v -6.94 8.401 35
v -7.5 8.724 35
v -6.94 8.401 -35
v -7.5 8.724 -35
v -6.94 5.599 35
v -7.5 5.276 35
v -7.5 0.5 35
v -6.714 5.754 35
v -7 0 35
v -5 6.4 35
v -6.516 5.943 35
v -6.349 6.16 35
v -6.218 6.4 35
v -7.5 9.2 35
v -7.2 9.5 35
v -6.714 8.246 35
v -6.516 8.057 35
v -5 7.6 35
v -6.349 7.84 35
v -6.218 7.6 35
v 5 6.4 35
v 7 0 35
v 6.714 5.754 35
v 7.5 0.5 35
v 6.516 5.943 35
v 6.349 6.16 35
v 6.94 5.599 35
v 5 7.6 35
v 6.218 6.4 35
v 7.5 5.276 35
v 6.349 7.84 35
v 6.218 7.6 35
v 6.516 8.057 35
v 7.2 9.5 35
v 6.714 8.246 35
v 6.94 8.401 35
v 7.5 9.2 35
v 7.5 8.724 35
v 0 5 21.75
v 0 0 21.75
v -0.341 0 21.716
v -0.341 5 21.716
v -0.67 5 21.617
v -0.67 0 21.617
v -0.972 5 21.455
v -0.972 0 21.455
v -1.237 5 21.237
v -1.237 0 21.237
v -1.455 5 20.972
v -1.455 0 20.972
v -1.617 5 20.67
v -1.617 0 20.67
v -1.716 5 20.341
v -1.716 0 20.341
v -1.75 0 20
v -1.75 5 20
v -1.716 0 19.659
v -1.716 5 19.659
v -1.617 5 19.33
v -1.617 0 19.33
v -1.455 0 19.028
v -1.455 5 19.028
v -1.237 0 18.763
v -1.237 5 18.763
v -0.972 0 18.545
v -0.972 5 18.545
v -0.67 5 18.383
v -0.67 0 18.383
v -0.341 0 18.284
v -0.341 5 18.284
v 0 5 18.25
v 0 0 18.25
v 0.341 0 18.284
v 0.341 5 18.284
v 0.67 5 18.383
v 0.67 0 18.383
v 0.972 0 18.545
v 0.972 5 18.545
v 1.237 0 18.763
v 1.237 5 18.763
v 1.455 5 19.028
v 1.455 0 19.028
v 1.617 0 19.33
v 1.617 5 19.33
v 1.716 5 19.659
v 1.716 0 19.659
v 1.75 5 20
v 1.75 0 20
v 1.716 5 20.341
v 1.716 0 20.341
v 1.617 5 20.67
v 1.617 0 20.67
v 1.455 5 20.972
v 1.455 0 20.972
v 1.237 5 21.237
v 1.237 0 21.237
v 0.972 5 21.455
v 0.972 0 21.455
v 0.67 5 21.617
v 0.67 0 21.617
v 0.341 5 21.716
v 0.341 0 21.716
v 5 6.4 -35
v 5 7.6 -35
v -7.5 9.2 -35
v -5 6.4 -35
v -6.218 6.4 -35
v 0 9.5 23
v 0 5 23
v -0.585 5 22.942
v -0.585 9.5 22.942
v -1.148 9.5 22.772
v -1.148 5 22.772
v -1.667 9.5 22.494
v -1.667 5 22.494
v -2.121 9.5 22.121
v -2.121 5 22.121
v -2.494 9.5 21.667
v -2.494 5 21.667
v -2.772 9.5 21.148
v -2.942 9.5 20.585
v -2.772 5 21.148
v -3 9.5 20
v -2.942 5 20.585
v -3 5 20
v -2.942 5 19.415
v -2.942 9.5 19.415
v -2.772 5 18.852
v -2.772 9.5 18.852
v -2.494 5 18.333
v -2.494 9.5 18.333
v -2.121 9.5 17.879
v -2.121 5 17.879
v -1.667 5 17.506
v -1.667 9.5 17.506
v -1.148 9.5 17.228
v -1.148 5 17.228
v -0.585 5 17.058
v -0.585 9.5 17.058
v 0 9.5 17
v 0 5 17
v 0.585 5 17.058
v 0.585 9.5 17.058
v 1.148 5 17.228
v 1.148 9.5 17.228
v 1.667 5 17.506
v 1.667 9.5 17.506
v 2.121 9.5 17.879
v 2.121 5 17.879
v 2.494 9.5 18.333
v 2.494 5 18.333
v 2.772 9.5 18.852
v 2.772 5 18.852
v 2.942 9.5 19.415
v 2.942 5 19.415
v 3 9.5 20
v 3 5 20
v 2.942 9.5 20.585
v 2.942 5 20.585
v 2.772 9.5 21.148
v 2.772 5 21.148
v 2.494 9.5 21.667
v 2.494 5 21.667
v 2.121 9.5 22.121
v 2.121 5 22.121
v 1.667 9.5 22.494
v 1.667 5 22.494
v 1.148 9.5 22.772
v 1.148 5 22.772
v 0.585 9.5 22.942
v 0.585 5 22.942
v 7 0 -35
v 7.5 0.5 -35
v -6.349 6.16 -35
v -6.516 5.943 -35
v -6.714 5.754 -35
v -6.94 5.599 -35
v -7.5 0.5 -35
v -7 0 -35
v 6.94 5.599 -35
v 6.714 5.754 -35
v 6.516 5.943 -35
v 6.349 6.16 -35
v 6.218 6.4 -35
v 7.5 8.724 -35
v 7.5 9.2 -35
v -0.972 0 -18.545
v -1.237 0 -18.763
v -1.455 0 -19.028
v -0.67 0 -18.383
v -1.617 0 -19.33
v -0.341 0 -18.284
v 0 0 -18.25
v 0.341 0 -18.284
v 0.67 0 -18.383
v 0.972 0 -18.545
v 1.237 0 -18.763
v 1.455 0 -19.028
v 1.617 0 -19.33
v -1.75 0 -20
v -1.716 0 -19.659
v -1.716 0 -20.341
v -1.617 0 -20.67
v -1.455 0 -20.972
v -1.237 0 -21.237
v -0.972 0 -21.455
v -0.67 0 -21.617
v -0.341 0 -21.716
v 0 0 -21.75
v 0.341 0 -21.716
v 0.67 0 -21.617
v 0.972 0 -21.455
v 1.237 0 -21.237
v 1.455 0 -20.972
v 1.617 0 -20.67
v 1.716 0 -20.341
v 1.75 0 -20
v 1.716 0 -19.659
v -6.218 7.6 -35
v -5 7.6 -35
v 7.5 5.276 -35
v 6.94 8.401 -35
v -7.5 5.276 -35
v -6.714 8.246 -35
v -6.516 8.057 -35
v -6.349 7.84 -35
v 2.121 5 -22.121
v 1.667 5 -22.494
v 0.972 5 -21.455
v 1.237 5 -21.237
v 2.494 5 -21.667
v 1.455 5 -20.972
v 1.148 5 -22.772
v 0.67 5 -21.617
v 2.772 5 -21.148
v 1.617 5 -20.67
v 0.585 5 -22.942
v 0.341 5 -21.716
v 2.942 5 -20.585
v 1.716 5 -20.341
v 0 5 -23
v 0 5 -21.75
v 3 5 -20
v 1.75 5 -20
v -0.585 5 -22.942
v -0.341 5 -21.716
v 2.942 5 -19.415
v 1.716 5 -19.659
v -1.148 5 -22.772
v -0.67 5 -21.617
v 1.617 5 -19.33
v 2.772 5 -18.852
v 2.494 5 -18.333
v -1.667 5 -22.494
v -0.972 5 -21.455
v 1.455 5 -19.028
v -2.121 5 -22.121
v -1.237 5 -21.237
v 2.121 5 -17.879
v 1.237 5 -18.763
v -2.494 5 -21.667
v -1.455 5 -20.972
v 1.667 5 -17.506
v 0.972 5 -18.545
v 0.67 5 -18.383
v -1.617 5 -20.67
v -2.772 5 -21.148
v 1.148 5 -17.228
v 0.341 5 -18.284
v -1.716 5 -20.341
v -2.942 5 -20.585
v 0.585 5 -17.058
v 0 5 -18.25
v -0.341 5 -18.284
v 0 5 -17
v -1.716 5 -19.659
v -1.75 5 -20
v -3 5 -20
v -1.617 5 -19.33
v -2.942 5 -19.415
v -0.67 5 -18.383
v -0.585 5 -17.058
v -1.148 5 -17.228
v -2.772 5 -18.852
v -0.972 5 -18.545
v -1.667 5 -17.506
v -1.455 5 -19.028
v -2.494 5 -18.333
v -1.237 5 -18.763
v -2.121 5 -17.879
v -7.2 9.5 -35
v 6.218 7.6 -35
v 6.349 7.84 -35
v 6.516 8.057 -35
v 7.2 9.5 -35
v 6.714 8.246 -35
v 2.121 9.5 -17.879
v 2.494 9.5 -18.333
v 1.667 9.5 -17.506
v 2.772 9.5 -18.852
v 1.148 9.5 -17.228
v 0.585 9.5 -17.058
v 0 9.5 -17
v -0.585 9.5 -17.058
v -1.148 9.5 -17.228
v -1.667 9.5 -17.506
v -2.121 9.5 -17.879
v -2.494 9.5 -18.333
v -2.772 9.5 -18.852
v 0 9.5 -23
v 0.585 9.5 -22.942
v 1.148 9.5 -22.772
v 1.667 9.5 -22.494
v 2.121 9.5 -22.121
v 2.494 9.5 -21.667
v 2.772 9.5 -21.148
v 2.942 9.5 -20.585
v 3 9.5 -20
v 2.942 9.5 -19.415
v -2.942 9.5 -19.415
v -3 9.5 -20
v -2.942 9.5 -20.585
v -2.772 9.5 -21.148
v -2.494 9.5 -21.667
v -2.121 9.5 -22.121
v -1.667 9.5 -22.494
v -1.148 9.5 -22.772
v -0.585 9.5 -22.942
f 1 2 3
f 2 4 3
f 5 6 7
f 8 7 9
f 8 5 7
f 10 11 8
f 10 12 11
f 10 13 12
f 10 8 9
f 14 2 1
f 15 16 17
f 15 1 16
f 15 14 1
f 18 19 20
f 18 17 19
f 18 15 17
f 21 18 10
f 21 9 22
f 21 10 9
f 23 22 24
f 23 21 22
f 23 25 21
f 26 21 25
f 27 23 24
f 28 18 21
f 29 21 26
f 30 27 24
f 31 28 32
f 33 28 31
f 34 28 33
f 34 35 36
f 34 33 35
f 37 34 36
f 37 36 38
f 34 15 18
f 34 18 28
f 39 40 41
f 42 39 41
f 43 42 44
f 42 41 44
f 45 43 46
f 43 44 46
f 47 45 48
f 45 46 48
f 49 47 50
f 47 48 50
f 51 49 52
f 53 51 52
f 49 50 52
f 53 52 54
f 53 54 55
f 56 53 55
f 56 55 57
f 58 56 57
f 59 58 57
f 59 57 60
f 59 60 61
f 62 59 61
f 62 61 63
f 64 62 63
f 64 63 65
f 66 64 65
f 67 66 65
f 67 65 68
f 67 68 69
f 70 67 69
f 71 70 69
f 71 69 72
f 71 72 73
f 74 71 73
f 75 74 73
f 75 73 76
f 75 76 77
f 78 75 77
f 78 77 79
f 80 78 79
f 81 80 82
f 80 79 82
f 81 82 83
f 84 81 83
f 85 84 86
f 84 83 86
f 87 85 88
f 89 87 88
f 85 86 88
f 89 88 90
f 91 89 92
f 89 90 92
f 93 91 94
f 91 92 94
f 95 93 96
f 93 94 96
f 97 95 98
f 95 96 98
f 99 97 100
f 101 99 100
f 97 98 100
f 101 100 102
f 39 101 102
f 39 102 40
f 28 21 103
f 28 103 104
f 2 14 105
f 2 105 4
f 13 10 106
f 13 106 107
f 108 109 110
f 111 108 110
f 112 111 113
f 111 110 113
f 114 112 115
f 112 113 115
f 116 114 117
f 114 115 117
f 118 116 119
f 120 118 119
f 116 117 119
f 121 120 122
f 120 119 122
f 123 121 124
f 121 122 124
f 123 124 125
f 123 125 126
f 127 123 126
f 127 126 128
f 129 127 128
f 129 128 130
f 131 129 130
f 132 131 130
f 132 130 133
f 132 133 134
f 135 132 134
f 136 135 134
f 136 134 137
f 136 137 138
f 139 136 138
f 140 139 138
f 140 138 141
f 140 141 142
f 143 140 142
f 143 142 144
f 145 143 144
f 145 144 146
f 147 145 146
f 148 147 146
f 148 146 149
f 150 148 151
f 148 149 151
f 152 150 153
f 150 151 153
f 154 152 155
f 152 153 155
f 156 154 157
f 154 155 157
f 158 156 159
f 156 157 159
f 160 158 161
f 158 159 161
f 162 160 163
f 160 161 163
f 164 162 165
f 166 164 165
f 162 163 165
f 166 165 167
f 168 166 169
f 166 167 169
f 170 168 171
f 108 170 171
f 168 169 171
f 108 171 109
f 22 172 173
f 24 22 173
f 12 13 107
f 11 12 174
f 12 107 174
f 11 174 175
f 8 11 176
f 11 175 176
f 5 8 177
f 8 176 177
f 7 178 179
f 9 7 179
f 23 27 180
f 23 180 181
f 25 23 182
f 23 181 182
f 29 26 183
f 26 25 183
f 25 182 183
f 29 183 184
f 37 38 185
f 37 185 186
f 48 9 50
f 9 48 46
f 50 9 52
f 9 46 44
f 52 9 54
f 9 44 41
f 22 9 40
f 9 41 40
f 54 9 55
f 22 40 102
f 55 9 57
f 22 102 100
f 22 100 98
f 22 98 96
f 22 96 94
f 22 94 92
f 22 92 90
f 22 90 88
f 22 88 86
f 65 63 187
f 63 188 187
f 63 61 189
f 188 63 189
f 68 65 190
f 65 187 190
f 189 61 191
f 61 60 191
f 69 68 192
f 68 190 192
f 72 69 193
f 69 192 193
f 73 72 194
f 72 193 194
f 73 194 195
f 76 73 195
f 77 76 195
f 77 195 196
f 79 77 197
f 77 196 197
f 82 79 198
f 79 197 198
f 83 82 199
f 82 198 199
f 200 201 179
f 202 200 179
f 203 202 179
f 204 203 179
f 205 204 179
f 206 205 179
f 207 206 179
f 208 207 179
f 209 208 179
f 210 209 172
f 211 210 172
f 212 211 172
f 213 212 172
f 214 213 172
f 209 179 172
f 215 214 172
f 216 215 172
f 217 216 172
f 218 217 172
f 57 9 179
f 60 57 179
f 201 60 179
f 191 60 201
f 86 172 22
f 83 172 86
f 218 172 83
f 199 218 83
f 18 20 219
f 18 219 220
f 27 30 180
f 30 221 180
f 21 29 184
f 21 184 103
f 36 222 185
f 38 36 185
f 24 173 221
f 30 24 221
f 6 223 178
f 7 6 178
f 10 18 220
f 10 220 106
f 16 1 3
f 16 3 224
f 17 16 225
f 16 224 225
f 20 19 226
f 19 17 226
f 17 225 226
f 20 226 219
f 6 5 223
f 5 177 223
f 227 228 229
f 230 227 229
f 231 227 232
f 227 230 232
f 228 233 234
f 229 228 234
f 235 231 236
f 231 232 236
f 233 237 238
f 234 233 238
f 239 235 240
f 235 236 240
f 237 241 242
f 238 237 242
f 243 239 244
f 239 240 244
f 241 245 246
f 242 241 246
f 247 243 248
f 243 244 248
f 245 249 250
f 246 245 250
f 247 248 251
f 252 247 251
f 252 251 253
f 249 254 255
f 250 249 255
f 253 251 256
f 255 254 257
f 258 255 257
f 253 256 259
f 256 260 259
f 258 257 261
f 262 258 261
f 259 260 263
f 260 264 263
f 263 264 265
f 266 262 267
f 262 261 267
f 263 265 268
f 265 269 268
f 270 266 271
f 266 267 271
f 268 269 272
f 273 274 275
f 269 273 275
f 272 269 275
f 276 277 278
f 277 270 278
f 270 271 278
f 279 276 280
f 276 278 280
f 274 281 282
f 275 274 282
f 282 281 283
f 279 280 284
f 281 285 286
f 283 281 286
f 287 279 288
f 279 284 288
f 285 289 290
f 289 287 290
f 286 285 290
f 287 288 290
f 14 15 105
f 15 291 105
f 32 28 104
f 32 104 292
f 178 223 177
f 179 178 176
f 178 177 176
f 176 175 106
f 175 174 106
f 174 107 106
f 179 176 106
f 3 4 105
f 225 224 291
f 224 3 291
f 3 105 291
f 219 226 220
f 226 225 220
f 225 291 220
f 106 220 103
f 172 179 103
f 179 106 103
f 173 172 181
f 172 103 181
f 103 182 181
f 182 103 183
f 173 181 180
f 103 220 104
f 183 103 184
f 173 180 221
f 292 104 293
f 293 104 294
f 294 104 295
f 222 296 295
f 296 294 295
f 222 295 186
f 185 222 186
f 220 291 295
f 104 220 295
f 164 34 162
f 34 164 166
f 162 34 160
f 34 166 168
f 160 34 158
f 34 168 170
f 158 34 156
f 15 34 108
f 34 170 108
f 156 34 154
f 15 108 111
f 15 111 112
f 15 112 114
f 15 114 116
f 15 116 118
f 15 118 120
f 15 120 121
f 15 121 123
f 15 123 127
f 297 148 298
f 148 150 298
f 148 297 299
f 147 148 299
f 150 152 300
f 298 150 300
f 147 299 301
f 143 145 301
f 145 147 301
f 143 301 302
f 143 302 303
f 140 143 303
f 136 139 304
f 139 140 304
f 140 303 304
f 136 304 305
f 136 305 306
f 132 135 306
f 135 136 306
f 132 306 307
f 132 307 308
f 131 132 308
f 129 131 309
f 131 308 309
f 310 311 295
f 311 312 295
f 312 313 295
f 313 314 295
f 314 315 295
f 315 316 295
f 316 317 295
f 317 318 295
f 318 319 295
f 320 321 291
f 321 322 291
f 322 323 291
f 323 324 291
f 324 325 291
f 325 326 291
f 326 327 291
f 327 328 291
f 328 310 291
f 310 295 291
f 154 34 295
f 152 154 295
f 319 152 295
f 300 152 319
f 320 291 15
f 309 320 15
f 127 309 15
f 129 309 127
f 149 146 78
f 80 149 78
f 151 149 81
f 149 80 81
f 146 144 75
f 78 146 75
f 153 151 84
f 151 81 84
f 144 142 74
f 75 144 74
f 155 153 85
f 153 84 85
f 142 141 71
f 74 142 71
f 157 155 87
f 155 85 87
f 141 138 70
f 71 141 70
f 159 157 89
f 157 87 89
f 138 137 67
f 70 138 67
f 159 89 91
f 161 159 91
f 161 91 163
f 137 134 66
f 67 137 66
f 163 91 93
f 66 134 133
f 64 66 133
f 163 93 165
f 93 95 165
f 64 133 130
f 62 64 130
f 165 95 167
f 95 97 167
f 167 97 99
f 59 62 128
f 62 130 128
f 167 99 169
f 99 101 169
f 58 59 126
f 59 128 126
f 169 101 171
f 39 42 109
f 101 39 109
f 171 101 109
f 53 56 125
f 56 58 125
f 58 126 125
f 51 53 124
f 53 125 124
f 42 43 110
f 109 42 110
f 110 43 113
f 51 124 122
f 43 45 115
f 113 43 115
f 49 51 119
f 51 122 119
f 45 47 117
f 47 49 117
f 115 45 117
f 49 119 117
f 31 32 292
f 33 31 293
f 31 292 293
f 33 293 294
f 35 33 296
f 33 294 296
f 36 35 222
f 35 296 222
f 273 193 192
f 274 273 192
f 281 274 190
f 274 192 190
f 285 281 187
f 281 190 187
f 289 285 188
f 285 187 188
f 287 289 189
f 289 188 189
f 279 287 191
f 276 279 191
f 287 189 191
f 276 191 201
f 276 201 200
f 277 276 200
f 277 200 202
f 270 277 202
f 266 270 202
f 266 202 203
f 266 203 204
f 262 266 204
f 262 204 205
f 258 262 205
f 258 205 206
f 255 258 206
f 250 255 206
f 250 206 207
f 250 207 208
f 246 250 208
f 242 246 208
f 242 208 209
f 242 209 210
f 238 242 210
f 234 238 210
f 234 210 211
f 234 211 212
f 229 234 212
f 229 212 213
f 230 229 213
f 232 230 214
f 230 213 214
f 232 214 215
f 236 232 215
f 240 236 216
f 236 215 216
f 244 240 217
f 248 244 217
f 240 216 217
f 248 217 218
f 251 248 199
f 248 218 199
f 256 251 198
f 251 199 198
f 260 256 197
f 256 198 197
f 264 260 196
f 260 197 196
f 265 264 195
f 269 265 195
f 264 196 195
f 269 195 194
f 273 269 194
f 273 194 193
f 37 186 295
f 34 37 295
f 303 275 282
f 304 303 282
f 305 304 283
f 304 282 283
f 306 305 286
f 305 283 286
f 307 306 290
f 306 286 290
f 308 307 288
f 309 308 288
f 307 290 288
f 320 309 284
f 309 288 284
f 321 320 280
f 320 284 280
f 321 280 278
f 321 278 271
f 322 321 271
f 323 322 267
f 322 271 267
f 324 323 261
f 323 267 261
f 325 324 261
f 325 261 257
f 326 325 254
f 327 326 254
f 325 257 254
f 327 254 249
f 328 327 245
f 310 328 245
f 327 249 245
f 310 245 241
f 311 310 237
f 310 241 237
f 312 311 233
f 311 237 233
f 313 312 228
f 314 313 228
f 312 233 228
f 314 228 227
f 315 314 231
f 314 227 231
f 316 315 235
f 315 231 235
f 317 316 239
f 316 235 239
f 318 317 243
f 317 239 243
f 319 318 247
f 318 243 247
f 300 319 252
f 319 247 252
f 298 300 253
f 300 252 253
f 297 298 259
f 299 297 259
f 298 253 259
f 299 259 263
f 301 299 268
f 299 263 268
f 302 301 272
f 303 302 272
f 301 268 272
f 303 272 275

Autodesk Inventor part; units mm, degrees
sketch "Sketch_12" plane through (0, 0, 0) normal (0, 0, 1) x (1, 0, 0)
  line L0 (-7.5, 9.2) -> (-7.5, 8.7239)
  line L1 (-7.5, 8.7239) -> (-6.94, 8.4006)
  arc A0 (-6.2177, 7.6) -> (-6.94, 8.4006) centre (-7.815, 6.885) ccw
  line L2 (-6.2177, 7.6) -> (-5, 7.6)
  line L3 (-5, 7.6) -> (-5, 6.4)
  line L4 (-5, 6.4) -> (-6.2177, 6.4)
  arc A1 (-6.94, 5.5994) -> (-6.2177, 6.4) centre (-7.815, 7.115) ccw
  line L5 (-6.94, 5.5994) -> (-7.5, 5.2762)
  line L6 (-7.5, 5.2762) -> (-7.5, 0.5)
  line L7 (-7.5, 0.5) -> (-7, 0)
  line L8 (-7, 0) -> (7, 0)
  line L9 (7, 0) -> (7.5, 0.5)
  line L10 (7.5, 0.5) -> (7.5, 5.2762)
  line L11 (7.5, 5.2762) -> (6.94, 5.5994)
  arc A2 (6.2177, 6.4) -> (6.94, 5.5994) centre (7.815, 7.115) ccw
  line L12 (6.2177, 6.4) -> (5, 6.4)
  line L13 (5, 6.4) -> (5, 7.6)
  line L14 (5, 7.6) -> (6.2177, 7.6)
  arc A3 (6.94, 8.4006) -> (6.2177, 7.6) centre (7.815, 6.885) ccw
  line L15 (6.94, 8.4006) -> (7.5, 8.7239)
  line L16 (7.5, 8.7239) -> (7.5, 9.2)
  line L17 (7.5, 9.2) -> (7.2, 9.5)
  line L18 (7.2, 9.5) -> (-7.2, 9.5)
  line L19 (-7.2, 9.5) -> (-7.5, 9.2)
extrude "Extrusion1" add sketch "Sketch_12" along normal mid plane 70
sketch "Sketch2" plane through (-7.2, 9.5, 35) normal (0, 1, 0) x (1, 0, 0)
  point P0 (7.2, 55)
hole "Hole1" at (0, 9.5, -20) direction (0, -1, 0) diameter 3.5 depth 9.5 counterbore diameter 6 counterbore depth 4.5
pattern_linear "Rectangular Pattern1" count 2 spacing 40 along (0, 0, 1) of "Hole1"
ref_plane "to_block_XY" through (0, 9.5, 0) normal (0, 0, 1) x (1, 0, 0)
ref_plane "to_block_YZ" through (0, 9.5, 0) normal (1, 0, 0) x (0, 1, 0)
ref_plane "to_block_ZX" through (0, 9.5, 0) normal (0, 1, 0) x (0, 0, 1)
properties part number "SSEBZ-MX16-70_r"
